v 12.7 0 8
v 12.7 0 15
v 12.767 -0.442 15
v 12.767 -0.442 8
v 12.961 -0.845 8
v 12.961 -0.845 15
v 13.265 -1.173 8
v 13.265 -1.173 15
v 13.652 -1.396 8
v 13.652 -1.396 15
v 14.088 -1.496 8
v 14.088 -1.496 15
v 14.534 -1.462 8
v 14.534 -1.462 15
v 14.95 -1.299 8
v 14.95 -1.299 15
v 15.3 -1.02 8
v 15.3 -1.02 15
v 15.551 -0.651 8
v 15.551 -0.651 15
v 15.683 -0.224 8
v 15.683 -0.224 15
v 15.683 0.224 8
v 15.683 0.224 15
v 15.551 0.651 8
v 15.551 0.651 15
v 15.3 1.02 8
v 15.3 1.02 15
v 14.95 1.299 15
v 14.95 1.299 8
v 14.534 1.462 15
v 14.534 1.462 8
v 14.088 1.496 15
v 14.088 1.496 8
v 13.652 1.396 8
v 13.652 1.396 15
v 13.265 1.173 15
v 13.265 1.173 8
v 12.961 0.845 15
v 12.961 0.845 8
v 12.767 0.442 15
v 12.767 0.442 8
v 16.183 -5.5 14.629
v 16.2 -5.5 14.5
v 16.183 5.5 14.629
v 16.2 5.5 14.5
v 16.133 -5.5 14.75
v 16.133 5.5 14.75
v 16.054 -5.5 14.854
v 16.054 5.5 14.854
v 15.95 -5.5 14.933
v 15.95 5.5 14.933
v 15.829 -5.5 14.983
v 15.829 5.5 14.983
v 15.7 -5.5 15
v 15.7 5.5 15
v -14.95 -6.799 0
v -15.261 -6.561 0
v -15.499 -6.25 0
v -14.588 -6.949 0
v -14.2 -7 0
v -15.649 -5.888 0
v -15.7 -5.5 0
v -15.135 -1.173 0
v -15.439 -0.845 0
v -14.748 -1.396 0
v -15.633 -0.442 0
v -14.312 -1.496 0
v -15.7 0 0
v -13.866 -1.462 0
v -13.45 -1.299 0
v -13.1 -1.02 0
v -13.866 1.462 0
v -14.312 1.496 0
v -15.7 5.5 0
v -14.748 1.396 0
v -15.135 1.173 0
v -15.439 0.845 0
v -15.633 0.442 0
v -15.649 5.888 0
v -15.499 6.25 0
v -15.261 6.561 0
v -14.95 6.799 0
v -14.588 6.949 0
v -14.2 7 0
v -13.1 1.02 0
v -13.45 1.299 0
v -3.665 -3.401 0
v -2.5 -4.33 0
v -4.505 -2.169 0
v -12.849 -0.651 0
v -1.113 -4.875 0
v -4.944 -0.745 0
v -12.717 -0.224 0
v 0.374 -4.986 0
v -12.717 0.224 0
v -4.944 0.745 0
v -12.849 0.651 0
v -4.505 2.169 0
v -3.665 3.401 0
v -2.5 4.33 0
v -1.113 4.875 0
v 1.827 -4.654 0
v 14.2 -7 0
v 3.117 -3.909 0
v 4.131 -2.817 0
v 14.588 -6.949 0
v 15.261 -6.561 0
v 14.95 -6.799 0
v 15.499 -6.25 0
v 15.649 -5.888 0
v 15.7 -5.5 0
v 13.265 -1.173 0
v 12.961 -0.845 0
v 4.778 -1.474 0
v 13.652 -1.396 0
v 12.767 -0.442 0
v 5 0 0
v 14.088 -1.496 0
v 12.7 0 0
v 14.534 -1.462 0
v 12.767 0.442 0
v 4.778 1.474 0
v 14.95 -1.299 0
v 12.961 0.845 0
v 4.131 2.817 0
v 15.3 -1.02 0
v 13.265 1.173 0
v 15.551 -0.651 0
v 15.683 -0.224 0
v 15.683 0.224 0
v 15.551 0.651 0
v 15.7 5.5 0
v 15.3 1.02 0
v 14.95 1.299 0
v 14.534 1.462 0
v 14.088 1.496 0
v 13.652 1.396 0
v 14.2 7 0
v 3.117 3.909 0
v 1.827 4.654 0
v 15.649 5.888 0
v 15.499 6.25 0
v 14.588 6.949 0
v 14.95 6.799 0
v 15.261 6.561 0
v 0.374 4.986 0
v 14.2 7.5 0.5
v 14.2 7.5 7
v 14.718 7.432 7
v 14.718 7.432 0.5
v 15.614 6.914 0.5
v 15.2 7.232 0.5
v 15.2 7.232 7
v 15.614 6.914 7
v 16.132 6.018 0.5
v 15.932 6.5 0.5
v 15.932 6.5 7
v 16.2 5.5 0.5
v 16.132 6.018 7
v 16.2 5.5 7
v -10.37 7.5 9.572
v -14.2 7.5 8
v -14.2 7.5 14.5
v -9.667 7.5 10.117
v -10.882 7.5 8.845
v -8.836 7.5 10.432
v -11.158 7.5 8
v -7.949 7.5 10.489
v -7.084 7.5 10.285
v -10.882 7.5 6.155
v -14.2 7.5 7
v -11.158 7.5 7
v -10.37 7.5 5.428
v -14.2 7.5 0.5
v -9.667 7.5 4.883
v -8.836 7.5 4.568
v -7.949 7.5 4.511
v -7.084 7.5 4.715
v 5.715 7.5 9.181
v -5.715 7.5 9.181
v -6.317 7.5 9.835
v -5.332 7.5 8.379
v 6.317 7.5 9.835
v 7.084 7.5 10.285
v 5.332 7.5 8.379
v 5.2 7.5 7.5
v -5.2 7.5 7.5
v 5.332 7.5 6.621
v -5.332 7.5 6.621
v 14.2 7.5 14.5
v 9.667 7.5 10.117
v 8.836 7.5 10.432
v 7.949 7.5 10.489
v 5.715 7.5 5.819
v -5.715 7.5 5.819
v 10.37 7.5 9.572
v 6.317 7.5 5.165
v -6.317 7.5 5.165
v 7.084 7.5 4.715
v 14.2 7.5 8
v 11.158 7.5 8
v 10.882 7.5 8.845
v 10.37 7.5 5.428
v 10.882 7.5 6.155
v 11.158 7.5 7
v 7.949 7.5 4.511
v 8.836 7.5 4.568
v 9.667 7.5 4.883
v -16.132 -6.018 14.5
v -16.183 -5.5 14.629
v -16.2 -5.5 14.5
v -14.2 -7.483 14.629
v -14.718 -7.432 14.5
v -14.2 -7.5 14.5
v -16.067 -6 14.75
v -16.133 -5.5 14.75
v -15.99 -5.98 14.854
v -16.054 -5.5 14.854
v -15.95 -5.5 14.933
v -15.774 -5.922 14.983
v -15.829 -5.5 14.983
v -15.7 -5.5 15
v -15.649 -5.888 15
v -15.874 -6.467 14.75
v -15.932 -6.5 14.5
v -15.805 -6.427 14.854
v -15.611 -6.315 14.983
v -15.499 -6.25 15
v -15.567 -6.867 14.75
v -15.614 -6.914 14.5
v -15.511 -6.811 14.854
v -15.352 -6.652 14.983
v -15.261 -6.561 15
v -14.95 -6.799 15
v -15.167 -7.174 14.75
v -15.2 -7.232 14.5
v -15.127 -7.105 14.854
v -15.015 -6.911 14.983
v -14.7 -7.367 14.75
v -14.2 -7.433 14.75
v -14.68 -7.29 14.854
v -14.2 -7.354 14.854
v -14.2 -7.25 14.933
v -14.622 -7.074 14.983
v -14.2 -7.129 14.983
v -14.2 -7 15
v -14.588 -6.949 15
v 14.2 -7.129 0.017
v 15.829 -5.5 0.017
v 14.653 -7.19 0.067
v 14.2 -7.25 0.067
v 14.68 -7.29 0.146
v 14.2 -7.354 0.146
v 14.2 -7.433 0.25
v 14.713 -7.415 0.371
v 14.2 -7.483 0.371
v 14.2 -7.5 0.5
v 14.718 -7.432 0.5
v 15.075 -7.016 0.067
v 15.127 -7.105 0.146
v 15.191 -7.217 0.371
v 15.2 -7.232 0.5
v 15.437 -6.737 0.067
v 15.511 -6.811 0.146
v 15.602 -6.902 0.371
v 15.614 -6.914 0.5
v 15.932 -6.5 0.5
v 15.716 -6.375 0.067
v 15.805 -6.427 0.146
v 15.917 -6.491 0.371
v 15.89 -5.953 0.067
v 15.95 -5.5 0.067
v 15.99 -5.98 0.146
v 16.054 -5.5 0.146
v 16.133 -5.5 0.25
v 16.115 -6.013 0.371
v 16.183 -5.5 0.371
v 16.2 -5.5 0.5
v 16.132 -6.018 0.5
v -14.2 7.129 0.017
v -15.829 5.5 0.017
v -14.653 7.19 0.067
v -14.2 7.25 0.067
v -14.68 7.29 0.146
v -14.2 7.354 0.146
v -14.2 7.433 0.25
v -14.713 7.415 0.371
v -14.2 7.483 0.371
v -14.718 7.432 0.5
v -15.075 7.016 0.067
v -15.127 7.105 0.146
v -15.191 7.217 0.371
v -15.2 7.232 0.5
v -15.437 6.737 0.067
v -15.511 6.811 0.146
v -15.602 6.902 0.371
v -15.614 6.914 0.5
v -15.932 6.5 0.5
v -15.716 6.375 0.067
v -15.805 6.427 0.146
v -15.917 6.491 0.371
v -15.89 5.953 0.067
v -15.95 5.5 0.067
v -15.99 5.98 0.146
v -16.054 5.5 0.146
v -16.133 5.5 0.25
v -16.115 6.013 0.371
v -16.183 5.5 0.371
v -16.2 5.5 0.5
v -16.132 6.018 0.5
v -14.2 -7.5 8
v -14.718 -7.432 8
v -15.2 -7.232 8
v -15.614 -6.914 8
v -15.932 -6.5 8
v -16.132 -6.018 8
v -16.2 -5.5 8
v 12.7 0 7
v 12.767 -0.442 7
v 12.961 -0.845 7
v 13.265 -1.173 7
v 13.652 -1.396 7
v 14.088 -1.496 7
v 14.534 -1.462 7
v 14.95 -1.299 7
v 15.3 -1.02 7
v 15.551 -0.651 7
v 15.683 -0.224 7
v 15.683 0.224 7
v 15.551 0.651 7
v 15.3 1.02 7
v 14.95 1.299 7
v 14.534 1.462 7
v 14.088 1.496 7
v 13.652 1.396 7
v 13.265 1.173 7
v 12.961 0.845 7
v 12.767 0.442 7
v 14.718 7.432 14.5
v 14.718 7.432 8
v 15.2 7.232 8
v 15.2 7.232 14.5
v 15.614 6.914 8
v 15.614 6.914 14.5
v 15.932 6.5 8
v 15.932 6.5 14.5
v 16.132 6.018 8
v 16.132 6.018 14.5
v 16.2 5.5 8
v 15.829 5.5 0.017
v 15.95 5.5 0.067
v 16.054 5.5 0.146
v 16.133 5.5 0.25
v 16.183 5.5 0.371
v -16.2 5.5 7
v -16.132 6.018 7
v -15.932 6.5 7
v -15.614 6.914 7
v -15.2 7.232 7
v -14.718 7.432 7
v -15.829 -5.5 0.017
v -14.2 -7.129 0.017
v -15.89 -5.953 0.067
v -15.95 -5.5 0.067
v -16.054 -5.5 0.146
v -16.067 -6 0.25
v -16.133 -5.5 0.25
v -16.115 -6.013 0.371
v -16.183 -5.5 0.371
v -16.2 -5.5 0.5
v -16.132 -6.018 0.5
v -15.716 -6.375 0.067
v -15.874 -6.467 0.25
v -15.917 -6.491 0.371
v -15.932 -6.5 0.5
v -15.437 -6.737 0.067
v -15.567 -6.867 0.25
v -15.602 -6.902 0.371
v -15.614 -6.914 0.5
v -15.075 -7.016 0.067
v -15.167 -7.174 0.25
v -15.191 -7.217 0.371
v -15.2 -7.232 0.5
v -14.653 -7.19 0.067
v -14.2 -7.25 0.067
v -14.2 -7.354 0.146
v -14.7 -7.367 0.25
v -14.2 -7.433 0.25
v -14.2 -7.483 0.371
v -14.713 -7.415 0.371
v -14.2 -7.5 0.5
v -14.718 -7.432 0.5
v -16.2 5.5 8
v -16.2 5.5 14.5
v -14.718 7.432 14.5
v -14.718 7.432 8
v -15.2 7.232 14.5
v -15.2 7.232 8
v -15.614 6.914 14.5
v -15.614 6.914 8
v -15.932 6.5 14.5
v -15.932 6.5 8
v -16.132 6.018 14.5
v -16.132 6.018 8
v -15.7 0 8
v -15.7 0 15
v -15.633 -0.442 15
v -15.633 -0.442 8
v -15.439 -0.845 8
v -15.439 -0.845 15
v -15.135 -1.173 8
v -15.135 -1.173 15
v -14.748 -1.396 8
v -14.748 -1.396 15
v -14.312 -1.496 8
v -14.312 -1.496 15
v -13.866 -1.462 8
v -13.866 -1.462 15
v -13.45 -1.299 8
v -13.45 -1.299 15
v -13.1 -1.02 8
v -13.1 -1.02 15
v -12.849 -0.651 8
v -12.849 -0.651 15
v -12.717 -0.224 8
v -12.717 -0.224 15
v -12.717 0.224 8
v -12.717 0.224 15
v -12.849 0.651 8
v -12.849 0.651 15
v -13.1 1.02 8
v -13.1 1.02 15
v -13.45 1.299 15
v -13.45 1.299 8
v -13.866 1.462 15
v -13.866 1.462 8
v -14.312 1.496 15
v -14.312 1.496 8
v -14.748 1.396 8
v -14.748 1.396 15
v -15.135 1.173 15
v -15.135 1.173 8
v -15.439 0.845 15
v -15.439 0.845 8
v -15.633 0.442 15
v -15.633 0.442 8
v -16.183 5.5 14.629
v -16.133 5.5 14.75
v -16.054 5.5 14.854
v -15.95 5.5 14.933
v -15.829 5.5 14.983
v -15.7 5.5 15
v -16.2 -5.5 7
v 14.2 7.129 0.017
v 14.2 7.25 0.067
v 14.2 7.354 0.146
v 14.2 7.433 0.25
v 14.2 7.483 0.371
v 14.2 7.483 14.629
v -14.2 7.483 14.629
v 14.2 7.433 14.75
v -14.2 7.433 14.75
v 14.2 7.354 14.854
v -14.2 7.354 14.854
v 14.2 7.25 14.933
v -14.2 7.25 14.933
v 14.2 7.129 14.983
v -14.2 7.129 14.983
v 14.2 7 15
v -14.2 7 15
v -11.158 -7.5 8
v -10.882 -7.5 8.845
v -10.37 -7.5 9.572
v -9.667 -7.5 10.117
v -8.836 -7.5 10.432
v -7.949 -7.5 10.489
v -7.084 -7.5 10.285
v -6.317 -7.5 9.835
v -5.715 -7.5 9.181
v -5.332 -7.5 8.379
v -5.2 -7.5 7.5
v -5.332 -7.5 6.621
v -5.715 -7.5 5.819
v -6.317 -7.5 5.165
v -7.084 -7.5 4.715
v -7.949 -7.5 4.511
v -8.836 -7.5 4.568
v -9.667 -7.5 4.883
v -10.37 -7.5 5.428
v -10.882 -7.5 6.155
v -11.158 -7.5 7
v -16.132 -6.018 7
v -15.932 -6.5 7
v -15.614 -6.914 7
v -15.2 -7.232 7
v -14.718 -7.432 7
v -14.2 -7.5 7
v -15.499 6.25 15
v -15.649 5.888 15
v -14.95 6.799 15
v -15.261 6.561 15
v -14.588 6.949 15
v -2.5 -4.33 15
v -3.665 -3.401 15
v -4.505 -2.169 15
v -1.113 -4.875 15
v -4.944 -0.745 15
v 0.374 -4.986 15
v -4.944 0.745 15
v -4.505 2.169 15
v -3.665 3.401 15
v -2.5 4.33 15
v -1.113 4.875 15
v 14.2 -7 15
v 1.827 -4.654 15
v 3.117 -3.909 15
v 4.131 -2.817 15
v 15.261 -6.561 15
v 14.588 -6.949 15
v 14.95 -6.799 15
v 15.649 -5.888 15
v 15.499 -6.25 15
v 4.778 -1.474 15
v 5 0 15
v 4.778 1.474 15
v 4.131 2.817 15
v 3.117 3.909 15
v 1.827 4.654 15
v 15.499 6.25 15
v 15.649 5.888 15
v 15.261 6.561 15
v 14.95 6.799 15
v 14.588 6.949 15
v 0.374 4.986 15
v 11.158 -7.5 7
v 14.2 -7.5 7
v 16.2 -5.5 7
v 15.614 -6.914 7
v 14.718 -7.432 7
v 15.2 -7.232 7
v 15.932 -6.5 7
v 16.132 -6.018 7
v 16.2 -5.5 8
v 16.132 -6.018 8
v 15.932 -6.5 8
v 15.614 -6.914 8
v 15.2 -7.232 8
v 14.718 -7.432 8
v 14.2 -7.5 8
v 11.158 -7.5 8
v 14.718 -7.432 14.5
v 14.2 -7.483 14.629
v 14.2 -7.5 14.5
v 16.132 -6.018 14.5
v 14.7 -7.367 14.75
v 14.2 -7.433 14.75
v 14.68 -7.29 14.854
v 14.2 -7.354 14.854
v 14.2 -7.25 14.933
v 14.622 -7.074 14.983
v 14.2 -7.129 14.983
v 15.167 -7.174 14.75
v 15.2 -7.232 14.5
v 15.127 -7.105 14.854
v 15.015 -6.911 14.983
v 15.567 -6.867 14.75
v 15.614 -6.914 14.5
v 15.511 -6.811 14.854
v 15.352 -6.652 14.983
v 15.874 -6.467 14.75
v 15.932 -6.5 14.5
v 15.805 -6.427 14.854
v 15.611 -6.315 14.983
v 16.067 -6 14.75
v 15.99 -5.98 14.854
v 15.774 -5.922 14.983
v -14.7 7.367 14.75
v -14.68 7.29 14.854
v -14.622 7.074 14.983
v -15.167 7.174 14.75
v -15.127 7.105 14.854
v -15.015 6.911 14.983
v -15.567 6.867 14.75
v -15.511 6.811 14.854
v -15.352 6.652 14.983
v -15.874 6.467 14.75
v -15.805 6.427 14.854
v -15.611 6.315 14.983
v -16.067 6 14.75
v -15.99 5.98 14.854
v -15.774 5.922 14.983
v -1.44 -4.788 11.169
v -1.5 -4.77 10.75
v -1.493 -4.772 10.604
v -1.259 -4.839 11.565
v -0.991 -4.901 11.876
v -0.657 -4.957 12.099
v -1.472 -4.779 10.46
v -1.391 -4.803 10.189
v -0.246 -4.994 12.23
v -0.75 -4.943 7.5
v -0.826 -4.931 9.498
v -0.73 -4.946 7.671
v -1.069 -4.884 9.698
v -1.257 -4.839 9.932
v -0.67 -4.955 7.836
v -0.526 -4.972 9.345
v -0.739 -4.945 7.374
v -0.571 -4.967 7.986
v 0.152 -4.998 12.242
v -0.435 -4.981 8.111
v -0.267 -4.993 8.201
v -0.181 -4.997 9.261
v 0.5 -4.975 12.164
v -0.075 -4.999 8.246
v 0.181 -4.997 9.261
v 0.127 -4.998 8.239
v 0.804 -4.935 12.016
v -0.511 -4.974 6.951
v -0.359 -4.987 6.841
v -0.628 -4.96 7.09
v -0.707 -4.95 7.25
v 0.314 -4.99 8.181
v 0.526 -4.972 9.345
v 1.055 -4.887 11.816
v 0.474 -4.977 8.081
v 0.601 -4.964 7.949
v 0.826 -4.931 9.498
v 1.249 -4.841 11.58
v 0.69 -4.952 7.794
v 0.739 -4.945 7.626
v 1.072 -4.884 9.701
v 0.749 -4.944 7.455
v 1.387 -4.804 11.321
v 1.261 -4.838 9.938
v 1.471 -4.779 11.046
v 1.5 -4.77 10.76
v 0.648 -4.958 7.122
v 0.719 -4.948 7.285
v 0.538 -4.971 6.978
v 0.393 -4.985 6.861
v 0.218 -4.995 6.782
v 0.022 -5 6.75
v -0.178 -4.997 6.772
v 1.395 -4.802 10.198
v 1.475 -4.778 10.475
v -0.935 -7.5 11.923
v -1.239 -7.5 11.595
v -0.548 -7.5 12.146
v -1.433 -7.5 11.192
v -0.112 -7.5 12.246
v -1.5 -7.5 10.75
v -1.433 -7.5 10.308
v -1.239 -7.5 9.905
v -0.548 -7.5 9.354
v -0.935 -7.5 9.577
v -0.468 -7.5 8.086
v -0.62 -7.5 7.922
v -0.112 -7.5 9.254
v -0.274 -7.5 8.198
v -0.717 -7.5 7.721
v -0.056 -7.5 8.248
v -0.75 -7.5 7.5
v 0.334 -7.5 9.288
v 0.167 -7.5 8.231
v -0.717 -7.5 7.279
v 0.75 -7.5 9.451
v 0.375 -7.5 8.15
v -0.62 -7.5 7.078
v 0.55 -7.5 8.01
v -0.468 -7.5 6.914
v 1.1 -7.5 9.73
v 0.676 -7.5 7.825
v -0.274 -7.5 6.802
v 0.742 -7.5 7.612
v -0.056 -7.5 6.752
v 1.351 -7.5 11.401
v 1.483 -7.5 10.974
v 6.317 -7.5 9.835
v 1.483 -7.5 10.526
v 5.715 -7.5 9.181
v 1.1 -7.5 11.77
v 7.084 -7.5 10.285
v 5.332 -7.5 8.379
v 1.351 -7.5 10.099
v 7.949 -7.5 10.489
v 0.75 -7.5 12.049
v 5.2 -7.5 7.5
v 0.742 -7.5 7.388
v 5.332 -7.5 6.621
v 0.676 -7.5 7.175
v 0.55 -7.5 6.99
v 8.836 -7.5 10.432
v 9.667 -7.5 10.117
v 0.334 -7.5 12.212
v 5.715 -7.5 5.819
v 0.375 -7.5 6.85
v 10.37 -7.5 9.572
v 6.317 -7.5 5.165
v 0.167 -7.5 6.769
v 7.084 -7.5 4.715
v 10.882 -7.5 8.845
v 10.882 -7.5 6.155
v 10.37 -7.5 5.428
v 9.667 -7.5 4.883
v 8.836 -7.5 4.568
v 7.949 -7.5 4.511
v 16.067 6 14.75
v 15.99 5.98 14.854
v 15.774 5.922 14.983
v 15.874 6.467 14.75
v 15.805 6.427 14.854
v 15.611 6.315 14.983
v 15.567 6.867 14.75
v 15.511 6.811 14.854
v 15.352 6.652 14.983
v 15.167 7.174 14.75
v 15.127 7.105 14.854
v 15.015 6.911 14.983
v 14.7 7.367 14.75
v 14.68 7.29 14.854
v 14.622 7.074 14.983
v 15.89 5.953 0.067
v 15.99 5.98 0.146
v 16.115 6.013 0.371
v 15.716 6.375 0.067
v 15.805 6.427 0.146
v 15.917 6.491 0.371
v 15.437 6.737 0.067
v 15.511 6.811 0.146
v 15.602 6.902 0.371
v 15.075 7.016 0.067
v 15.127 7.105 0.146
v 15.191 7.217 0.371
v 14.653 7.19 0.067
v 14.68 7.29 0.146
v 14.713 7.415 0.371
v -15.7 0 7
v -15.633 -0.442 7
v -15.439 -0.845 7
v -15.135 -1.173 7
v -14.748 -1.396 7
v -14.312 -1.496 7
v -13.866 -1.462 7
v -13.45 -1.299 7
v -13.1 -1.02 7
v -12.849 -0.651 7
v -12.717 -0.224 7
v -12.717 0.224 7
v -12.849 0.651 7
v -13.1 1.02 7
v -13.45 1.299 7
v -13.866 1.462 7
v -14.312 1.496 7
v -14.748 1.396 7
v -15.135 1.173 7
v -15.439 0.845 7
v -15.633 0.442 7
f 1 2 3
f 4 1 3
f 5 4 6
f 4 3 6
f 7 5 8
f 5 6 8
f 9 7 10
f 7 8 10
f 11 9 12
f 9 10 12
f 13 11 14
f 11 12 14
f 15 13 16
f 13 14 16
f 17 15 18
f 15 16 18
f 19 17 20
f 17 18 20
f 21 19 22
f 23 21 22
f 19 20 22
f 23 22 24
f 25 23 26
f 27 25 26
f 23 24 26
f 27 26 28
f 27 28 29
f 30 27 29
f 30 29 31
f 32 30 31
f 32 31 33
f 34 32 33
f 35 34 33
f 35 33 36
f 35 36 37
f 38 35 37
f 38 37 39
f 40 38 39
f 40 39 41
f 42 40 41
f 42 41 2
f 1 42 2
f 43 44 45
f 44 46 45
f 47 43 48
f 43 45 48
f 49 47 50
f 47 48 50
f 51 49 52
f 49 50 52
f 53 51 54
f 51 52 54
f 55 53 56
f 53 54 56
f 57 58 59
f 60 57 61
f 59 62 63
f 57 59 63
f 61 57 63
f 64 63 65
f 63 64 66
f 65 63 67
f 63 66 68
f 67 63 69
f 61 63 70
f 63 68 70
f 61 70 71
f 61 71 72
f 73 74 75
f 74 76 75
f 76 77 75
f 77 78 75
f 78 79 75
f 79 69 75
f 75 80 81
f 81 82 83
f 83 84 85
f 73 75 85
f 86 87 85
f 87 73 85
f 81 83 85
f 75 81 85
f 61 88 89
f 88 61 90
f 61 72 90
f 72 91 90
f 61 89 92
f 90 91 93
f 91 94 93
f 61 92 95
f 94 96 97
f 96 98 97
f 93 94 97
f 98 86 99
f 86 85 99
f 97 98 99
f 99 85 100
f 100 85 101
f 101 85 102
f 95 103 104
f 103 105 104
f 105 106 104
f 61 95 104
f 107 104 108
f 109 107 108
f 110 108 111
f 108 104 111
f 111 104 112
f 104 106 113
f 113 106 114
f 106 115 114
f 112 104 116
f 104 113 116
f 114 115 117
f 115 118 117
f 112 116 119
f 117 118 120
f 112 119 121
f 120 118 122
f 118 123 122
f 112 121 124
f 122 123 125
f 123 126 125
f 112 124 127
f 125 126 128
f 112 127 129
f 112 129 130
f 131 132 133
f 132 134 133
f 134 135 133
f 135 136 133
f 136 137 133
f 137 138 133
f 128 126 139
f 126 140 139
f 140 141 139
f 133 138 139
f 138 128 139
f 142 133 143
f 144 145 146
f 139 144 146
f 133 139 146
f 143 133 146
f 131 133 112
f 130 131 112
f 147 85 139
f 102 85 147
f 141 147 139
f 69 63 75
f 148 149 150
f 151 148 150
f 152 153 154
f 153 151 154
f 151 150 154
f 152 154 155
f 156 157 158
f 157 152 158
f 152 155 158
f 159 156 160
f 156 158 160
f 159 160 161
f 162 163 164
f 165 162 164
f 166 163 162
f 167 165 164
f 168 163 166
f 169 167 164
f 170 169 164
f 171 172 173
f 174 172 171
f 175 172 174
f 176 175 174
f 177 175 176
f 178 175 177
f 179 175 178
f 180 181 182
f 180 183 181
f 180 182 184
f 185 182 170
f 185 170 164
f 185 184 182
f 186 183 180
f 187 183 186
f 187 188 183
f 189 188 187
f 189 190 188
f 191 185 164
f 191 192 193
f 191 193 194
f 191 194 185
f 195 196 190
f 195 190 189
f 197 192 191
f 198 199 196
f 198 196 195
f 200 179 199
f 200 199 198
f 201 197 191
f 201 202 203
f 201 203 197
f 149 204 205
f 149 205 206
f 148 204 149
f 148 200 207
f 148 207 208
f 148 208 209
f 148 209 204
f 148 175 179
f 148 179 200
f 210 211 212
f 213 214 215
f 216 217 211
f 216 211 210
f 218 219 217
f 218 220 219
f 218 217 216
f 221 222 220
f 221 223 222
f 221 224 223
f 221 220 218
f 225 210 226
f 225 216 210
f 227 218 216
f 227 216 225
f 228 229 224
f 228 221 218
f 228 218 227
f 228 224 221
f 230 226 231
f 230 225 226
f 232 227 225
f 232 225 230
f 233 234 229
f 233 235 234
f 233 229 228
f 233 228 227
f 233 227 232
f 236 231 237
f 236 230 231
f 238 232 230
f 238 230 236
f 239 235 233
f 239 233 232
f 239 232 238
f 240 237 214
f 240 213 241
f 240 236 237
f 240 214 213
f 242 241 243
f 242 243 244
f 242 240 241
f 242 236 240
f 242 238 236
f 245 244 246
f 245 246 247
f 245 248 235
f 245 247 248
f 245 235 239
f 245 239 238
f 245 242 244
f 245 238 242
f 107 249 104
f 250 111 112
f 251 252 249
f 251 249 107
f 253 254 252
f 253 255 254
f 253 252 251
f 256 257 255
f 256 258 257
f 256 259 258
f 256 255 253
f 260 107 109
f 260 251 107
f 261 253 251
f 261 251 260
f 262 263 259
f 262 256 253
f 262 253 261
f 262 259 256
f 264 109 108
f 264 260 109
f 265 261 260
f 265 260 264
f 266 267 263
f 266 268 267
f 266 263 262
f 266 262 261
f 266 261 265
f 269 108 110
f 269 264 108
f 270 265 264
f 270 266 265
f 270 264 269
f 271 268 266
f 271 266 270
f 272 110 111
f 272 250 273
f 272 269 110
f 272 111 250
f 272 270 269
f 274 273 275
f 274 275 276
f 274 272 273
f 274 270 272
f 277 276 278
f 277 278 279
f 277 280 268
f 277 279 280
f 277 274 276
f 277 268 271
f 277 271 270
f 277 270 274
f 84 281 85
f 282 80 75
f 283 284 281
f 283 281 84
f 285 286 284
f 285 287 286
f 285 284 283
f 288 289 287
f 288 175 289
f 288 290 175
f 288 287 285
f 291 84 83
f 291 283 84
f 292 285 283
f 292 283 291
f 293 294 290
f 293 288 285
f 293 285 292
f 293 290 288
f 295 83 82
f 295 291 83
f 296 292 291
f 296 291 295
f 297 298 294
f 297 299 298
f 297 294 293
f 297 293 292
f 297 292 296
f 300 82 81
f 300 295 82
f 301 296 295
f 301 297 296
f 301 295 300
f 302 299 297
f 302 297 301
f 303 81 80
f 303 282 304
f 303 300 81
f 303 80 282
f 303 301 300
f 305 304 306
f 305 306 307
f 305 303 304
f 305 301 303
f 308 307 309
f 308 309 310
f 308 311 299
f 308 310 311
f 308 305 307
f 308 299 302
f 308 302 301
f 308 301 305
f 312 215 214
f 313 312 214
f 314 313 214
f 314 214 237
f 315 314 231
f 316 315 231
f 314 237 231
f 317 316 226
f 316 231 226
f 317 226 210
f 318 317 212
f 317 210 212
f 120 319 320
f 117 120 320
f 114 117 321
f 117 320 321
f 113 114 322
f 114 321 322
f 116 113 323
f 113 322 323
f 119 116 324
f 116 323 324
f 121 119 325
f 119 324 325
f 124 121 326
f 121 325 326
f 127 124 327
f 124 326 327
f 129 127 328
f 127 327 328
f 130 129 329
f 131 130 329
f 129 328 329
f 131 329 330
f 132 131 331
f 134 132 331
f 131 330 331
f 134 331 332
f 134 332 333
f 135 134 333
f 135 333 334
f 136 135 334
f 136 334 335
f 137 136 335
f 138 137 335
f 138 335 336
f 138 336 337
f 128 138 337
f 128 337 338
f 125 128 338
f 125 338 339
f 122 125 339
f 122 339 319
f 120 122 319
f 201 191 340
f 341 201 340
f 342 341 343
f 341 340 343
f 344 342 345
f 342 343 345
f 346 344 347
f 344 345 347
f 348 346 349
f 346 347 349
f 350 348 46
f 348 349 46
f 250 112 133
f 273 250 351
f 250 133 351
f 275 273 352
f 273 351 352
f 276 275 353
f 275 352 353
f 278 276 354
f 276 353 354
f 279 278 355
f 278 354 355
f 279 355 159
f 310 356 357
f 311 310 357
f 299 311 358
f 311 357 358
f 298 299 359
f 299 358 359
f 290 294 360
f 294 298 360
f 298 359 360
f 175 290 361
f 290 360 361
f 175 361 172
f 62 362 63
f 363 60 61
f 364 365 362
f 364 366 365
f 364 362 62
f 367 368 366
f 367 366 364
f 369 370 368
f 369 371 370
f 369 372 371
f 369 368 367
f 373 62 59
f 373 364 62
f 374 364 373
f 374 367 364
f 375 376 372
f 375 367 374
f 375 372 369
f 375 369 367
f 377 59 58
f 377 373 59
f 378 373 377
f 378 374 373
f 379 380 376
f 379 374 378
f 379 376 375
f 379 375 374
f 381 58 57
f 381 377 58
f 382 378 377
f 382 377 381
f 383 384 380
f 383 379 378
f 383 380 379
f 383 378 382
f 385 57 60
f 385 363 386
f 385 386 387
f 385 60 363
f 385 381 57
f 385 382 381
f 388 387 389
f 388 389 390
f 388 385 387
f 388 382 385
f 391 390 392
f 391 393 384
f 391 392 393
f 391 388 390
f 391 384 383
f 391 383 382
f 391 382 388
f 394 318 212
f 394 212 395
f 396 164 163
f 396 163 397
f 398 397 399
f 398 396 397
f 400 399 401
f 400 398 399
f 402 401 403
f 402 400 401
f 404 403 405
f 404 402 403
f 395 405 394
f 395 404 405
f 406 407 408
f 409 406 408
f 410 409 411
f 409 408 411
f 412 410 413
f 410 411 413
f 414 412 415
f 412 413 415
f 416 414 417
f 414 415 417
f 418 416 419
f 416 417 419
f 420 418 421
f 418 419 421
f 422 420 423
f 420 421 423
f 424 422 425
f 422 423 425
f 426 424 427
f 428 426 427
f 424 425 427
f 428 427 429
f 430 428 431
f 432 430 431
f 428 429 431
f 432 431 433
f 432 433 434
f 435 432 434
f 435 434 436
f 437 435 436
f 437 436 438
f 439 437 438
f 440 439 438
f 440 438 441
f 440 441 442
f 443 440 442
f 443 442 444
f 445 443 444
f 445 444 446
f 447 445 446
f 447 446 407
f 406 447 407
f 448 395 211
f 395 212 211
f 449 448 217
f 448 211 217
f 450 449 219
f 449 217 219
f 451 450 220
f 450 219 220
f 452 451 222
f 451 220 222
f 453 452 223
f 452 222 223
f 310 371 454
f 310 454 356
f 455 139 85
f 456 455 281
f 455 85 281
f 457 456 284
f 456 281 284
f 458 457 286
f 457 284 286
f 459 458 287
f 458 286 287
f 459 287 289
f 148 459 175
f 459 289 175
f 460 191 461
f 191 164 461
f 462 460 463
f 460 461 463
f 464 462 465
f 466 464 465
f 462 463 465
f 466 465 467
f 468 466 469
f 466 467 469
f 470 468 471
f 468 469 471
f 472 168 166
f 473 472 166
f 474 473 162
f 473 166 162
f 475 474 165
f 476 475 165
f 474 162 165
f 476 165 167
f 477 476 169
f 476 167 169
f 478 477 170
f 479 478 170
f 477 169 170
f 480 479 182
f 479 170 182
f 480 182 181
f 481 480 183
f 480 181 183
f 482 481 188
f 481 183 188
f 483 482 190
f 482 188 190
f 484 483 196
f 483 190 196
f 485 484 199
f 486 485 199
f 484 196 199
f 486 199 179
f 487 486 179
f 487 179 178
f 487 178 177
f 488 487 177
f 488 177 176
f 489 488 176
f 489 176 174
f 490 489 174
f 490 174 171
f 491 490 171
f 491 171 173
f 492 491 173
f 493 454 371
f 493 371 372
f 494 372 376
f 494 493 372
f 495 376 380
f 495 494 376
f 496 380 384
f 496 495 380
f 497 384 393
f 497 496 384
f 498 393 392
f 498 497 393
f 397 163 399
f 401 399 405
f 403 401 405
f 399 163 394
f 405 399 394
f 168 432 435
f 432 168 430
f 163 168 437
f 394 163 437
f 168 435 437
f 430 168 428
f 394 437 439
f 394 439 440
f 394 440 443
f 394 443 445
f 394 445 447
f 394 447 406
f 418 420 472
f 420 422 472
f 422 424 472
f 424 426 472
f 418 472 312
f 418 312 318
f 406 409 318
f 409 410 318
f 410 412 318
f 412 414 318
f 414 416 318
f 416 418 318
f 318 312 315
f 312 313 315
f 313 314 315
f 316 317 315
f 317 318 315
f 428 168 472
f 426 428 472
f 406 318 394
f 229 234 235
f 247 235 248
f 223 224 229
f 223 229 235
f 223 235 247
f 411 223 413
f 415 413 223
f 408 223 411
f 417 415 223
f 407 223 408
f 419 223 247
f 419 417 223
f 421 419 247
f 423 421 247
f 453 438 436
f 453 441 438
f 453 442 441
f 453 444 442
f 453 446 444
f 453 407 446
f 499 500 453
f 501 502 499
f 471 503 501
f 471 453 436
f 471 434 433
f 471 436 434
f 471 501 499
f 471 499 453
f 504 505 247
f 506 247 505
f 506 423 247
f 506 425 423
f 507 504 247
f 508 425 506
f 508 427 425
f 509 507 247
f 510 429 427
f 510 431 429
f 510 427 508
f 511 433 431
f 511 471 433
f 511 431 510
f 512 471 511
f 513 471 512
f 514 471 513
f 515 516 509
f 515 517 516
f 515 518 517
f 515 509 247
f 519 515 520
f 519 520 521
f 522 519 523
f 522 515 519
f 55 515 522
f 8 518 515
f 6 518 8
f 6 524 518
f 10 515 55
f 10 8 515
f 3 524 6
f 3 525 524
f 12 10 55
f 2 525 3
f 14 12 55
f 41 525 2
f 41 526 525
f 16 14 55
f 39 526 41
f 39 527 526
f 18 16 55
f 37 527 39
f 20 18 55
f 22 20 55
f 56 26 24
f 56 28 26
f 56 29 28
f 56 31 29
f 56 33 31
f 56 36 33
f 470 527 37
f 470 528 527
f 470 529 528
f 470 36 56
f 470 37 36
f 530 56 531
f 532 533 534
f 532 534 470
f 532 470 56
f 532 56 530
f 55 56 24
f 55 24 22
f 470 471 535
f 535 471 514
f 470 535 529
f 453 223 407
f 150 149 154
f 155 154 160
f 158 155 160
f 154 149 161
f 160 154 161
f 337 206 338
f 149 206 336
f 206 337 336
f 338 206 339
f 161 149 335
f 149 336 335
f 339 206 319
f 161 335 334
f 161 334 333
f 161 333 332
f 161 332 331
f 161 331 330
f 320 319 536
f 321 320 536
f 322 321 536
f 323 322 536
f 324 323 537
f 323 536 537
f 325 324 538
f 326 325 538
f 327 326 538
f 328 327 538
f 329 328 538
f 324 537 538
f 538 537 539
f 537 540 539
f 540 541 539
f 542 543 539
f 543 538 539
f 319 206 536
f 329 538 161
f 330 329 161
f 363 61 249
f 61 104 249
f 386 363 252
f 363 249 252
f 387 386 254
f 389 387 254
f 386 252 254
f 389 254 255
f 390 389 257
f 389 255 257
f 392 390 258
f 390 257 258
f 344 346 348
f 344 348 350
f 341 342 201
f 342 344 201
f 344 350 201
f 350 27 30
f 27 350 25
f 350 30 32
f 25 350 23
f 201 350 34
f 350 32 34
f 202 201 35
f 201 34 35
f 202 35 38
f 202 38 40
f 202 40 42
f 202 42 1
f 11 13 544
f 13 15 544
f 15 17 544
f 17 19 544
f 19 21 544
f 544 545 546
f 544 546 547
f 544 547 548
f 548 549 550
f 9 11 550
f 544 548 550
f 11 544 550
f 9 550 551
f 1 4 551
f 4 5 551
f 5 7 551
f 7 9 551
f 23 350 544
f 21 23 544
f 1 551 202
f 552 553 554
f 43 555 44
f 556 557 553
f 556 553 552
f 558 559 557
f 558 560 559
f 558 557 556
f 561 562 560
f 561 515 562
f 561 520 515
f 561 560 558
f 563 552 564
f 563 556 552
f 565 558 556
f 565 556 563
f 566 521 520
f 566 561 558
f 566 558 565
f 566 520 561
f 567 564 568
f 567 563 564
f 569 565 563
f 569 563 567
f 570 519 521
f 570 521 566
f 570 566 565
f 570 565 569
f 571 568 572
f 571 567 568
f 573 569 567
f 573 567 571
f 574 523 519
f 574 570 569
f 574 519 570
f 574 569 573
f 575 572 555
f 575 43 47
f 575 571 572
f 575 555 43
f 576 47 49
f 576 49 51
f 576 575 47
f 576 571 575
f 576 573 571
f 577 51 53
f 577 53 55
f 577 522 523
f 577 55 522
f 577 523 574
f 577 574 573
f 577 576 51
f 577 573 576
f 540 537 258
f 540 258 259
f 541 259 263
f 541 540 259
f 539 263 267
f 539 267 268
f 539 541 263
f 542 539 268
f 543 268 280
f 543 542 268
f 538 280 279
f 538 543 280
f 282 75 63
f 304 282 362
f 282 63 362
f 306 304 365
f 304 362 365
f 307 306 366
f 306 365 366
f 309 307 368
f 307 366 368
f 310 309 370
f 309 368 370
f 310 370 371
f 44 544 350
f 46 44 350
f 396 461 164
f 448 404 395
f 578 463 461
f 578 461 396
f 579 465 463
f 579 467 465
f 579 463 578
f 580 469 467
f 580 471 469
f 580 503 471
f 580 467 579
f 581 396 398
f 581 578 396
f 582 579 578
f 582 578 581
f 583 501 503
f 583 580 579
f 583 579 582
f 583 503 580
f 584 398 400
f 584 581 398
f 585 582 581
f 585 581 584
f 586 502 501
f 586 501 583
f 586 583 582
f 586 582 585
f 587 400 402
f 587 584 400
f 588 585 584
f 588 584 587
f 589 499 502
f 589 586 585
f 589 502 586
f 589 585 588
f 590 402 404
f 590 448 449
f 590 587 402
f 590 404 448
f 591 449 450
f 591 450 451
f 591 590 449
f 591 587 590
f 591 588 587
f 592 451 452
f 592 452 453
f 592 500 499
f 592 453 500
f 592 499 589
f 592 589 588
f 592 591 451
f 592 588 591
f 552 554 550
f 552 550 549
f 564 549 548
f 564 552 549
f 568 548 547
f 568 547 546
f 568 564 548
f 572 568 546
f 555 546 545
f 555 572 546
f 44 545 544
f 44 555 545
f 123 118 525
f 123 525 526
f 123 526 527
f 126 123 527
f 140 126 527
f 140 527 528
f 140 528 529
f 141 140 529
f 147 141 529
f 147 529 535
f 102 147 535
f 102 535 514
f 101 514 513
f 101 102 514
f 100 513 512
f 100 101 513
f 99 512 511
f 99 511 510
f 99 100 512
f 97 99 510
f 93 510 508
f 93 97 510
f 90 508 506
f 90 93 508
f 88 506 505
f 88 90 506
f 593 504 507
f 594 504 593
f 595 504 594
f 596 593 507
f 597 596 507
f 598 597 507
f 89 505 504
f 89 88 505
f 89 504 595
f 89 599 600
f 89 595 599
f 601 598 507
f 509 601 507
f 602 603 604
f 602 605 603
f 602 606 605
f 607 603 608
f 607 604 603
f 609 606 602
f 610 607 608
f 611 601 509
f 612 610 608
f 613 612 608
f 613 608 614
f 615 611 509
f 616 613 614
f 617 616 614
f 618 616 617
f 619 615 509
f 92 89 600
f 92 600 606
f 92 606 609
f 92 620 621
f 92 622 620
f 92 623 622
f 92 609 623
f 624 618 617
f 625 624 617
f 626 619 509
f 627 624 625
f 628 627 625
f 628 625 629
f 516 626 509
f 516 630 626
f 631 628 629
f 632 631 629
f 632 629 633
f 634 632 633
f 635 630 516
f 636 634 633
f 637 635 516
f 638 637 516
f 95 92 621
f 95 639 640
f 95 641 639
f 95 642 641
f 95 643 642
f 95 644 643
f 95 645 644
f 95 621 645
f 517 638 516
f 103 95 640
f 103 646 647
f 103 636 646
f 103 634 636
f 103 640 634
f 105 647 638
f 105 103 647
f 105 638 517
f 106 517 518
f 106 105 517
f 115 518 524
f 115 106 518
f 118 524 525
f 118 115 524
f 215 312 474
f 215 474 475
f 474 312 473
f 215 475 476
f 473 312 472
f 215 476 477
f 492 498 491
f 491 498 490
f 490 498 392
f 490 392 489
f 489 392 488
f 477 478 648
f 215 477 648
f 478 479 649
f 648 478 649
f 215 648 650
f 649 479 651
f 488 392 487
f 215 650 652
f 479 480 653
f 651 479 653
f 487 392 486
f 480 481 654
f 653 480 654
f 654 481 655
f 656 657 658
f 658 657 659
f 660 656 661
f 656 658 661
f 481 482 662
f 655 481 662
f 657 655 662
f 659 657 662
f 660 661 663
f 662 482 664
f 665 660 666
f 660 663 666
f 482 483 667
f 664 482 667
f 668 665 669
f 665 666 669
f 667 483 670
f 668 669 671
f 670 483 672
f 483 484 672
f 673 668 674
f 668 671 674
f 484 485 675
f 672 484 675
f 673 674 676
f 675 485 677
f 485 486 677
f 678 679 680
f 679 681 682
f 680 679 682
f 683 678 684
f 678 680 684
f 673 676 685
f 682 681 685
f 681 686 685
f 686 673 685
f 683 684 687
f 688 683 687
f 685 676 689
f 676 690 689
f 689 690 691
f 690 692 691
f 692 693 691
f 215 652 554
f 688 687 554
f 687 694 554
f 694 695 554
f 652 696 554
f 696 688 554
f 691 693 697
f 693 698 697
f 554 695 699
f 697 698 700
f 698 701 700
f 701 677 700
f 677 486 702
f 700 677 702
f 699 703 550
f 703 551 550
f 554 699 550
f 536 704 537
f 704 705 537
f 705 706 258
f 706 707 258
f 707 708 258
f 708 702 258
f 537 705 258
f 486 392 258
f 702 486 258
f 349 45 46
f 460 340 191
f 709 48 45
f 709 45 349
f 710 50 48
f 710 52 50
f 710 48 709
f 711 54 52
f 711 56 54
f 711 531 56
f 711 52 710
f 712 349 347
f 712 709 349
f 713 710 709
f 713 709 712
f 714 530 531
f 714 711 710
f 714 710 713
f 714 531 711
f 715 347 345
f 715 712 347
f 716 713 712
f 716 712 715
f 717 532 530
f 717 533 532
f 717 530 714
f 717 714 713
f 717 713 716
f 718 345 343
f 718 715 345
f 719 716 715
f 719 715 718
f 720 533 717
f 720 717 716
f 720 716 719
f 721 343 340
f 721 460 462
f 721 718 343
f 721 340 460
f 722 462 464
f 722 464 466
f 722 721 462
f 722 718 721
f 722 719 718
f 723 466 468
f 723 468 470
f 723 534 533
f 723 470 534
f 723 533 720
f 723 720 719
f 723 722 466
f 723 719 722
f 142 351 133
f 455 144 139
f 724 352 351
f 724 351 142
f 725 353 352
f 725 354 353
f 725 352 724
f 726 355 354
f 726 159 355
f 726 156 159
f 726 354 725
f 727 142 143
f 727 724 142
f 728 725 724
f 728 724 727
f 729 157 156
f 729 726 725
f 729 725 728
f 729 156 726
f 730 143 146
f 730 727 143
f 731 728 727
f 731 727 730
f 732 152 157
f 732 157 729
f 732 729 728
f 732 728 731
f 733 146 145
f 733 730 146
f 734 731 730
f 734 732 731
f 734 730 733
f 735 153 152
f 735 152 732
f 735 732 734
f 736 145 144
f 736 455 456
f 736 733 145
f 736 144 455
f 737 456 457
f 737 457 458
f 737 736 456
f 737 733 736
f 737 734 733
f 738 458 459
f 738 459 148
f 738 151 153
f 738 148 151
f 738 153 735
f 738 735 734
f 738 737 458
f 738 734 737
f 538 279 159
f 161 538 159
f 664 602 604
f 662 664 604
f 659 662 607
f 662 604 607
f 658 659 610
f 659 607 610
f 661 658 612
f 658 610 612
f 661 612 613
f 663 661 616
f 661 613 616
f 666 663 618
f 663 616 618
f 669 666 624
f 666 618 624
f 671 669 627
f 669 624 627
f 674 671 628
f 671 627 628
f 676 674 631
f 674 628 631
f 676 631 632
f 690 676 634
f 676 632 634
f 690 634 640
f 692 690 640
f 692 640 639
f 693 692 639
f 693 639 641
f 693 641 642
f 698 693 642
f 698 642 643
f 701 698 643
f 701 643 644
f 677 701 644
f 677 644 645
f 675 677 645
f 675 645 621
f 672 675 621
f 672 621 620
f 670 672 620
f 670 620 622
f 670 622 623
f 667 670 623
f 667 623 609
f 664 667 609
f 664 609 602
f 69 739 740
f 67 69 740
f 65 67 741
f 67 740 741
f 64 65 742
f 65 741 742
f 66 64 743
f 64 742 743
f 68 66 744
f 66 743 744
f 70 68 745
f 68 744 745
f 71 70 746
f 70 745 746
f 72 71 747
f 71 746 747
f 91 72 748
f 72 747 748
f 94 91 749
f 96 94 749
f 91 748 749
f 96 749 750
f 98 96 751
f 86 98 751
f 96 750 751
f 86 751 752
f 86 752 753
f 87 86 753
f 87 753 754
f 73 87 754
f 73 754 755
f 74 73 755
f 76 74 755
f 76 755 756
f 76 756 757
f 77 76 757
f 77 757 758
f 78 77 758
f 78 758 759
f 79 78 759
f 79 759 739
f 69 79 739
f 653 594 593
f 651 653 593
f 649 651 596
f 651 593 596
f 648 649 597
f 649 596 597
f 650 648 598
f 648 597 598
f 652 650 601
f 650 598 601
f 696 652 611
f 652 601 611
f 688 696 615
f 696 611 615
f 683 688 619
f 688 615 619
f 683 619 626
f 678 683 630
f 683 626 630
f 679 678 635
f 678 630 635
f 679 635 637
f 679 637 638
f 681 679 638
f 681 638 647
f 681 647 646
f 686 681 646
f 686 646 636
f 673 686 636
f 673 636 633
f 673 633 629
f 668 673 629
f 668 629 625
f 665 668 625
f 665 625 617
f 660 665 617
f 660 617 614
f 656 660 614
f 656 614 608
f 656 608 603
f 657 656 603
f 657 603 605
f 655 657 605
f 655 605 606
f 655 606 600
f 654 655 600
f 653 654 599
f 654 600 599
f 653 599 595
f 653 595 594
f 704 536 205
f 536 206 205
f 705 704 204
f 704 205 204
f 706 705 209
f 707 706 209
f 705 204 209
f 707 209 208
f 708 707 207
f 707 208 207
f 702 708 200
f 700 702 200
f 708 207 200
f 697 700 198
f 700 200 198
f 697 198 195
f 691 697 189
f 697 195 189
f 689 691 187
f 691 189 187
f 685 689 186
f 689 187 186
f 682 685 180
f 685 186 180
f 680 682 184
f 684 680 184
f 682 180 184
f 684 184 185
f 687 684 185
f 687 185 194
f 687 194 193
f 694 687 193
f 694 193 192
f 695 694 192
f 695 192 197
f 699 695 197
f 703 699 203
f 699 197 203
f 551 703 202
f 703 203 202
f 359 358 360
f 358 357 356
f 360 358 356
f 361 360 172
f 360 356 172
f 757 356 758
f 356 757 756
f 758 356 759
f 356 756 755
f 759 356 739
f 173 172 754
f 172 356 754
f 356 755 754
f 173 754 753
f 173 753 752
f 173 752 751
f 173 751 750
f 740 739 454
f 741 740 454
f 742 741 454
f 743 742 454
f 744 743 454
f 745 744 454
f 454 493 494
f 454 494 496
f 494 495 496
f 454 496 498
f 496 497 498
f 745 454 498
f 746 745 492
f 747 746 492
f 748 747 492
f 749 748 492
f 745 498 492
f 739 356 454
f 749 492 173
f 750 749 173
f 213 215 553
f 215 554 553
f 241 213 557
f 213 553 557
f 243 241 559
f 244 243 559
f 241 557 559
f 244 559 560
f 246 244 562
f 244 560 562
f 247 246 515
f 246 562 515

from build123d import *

# Parameters (mm, degrees)
F0_W     = 32.4
F0_H     = 15
F0_R     = 5
F1_DEPTH = 15
F3_D     = 6
F4_D     = 6
F5_DEPTH = 15
F6_DEPTH = 15
F7_D     = 3
F8_D     = 1.5
F8_DEPTH = 3
F8_TIP   = 0.4506454643
F9_D     = 3
F9_DEPTH = 3
F9_TIP   = 0.9012909285
F10_R    = 2
F11_R    = 0.49999


# Not quite as in the source:
# - a fillet or chamfer is up to 0.001 mm smaller than in the source, because OpenCascade refuses the exact size


with BuildPart() as f1:
    # F0 (on Top) → F1 (new body)
    with BuildSketch(Plane.XY):
        Rectangle(F0_W, F0_H)
        Circle(F0_R, mode=Mode.SUBTRACT)
    extrude(amount=F1_DEPTH)

    # F3 (through all)
    with Locations(Plane.XZ.offset(7.5)):
        with Locations((-8.2, 7.5)):
            Hole(F3_D / 2)

    # F4 (through all)
    with Locations(Plane.XZ.offset(7.5)):
        with Locations((8.2, 7.5)):
            Hole(F4_D / 2)

    # F2 (on face) → F5 (cut, through all)
    with BuildSketch(Plane.XZ.offset(7.5)):
        with BuildLine():
            Line((-11.1580398915, 8), (-16.2, 8))
            Line((-16.2, 8), (-16.2, 7.5))
            Line((-16.2, 7.5), (-16.2, 7))
            Line((-16.2, 7), (-11.1580398915, 7))
            ThreePointArc((-11.1580398915, 7), (-11.2, 7.5), (-11.1580398915, 8))
        make_face()
    extrude(amount=-F5_DEPTH, mode=Mode.SUBTRACT)

    # F2 (on face) → F6 (cut, through all)
    with BuildSketch(Plane.XZ.offset(7.5)):
        with BuildLine():
            ThreePointArc((11.1580398915, 8), (11.1894915684, 7.7508787808), (11.2, 7.5))
            ThreePointArc((11.2, 7.5), (11.1894915684, 7.2491212192), (11.1580398915, 7))
            Line((11.1580398915, 7), (16.2, 7))
            Line((16.2, 7), (16.2, 7.5))
            Line((16.2, 7.5), (16.2, 8))
            Line((16.2, 8), (11.1580398915, 8))
        make_face()
    extrude(amount=-F6_DEPTH, mode=Mode.SUBTRACT)

    # F7 (through all)
    with Locations(Plane(origin=(0, 0, 0), x_dir=(1, 0, 0), z_dir=(0, 0, -1))):
        with Locations((-14.2, 0), (14.2, 0)):
            Hole(F7_D / 2)

    # F8
    with Locations(Plane.XZ.offset(7.5)):
        with Locations((0, 7.5)):
            Hole(F8_D / 2, depth=F8_DEPTH)
            with Locations((0, 0, -(F8_DEPTH + F8_TIP / 2))):  # 118° drill point
                Cone(0, F8_D / 2, F8_TIP, mode=Mode.SUBTRACT)

    # F9
    with Locations(Plane.XZ.offset(7.5)):
        with Locations((0, 10.75)):
            Hole(F9_D / 2, depth=F9_DEPTH)
            with Locations((0, 0, -(F9_DEPTH + F9_TIP / 2))):  # 118° drill point
                Cone(0, F9_D / 2, F9_TIP, mode=Mode.SUBTRACT)

    # F10
    f10_edges = [f1.edges().sort_by_distance(p)[0] for p in [
        (16.2, -7.5, 11.5),
        (16.2, -7.5, 3.5),
        (16.2, 7.5, 11.5),
        (16.2, 7.5, 3.5),
        (-16.2, -7.5, 3.5),
        (-16.2, -7.5, 11.5),
        (-16.2, 7.5, 3.5),
        (-16.2, 7.5, 11.5),
    ]]
    fillet(f10_edges, radius=F10_R)

    # F11 (radius 0.5 in the source; OpenCascade refuses exactly that, so slightly less here)
    f11_edges = [f1.edges().sort_by_distance(p)[0] for p in [
        (0, -7.5, 0),
        (0, 7.5, 0),
        (0, -7.5, 15),
        (0, 7.5, 15),
    ]]
    fillet(f11_edges, radius=F11_R)


solid = f1.part
